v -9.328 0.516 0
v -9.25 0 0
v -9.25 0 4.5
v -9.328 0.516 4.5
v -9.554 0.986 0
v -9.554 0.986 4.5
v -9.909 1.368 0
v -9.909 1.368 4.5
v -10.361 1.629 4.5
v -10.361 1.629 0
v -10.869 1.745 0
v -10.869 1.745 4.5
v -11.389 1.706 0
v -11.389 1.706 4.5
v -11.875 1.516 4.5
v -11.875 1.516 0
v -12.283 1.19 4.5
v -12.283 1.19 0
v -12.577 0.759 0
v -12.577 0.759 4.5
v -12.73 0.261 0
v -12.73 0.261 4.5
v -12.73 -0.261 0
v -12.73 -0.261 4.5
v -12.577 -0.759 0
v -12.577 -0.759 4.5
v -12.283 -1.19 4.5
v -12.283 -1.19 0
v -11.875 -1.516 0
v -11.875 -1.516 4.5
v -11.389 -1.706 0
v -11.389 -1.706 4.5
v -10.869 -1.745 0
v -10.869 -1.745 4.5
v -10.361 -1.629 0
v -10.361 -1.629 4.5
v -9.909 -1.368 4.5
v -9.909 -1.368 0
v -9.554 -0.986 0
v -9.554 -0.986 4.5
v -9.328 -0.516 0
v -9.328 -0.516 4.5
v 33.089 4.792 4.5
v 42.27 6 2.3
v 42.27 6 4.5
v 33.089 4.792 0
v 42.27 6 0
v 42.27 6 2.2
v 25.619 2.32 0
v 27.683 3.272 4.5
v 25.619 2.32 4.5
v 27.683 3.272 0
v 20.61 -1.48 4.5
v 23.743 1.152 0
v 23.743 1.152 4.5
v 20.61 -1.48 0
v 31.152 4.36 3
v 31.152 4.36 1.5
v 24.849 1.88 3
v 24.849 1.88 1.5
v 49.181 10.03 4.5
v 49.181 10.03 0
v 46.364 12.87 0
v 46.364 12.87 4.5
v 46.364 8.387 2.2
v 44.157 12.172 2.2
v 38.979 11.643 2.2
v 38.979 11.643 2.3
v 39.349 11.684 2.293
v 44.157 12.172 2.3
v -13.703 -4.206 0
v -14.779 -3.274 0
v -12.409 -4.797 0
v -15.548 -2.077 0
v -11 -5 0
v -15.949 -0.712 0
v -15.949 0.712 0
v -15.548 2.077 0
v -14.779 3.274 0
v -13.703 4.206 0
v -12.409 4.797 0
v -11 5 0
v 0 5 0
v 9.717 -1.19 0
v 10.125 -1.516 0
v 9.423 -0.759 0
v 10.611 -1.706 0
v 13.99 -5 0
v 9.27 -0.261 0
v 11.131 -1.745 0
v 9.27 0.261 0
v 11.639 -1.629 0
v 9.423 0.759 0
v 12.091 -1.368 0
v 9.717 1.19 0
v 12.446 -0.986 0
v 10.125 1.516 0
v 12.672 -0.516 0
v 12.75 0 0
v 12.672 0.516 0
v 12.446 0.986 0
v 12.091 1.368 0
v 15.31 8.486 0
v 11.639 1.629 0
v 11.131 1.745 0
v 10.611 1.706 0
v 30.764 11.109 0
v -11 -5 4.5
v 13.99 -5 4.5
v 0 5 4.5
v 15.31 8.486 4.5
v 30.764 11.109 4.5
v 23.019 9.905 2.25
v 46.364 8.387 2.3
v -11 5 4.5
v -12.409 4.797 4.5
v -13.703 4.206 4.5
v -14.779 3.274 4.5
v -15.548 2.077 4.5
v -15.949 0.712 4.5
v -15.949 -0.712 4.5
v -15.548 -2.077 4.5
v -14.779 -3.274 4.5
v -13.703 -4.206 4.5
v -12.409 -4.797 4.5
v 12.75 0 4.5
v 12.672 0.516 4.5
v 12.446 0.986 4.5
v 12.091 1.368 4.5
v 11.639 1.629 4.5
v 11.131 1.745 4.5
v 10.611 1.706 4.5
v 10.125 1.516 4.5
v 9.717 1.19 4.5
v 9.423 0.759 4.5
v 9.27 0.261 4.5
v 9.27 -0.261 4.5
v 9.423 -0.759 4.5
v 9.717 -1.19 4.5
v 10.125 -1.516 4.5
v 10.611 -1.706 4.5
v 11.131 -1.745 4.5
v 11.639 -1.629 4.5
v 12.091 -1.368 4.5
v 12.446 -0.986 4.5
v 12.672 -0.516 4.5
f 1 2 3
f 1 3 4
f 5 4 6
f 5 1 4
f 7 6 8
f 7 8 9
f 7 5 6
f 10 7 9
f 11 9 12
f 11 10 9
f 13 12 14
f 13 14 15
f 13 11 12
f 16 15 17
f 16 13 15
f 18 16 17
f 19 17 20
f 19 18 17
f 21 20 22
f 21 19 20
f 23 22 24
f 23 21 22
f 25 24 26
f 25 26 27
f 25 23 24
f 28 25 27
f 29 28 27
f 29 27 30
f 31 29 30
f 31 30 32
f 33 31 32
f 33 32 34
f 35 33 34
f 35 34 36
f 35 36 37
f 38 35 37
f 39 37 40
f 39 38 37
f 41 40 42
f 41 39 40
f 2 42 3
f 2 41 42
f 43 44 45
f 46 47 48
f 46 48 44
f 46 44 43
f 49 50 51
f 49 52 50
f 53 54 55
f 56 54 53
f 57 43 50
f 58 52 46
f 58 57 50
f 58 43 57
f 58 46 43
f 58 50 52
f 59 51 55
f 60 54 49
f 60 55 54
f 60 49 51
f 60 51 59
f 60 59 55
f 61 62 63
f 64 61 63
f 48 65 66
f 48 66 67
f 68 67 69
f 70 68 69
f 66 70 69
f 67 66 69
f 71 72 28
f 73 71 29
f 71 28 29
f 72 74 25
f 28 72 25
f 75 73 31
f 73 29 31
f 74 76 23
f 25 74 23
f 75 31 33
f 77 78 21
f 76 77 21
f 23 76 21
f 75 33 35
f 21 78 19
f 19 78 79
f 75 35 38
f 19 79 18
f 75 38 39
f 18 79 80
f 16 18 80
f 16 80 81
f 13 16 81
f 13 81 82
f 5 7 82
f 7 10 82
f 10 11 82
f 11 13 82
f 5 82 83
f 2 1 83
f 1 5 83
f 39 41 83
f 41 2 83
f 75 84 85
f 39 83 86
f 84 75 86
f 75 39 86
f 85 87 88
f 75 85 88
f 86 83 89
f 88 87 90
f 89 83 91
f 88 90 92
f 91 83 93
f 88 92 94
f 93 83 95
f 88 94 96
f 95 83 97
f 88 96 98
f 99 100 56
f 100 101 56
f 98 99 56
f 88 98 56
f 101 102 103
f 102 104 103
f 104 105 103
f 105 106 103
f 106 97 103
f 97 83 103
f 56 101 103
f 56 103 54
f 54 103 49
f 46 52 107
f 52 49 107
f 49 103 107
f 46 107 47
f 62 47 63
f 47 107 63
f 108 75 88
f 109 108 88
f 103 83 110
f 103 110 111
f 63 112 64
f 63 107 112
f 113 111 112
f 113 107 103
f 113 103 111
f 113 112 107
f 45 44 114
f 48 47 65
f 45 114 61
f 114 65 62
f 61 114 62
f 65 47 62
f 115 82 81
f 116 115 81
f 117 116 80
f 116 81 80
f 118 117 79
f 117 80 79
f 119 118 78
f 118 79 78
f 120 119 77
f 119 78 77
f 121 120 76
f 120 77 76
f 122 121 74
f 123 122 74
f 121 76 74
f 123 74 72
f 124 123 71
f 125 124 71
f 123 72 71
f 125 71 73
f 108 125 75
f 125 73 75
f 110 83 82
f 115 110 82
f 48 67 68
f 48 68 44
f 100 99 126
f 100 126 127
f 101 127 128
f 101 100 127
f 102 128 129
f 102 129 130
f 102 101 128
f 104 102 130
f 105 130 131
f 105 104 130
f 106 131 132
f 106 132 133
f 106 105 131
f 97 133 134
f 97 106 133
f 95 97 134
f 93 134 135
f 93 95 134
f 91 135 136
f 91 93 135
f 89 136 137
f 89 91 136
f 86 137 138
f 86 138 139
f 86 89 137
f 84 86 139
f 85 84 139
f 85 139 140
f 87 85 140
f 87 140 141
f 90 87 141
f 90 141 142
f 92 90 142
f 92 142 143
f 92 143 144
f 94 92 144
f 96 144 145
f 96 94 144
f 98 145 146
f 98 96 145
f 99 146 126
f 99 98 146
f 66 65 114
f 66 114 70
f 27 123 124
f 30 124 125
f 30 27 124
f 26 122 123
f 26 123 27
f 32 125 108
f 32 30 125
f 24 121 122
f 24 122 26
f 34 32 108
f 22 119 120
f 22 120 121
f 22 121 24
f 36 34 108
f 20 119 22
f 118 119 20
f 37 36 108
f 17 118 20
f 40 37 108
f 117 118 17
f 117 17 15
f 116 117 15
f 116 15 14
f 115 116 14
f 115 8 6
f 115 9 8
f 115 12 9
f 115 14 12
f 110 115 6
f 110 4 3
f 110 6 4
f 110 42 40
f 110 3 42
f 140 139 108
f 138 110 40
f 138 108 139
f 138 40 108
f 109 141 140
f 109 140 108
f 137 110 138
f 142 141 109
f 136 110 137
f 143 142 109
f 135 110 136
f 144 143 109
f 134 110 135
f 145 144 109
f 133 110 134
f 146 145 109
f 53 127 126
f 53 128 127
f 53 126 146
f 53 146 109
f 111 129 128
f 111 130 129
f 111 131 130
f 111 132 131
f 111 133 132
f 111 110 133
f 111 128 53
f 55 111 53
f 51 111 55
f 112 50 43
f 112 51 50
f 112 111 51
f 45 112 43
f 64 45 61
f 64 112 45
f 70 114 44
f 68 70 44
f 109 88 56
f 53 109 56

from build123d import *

# Parameters (mm, degrees)
SKETCH1_R           = 5
SKETCH1_R_2         = 1.75
BOSS_EXTRUDE1_DEPTH = 4.5
BOSS_EXTRUDE2_START = -4.5
BOSS_EXTRUDE2_DEPTH = 4.5
CUT_EXTRUDE3_START  = 2.2
CUT_EXTRUDE3_DEPTH  = 0.1


# Read off the part's stored shape, not the designer's step: Cut-Extrude3
with BuildPart() as part:
    # Sketch1 → Boss-Extrude1 (new body)
    # profile 1 of 3: a face of its own
    with BuildSketch(Plane.XY):
        with Locations((-11, 0)):
            Circle(SKETCH1_R)
        with Locations((-11, 0)):
            Circle(SKETCH1_R_2, mode=Mode.SUBTRACT)
    # profile 2 of 3: a face of its own
    with BuildSketch(Plane.XY):
        with Locations((11, 0)):
            Circle(SKETCH1_R)
        with Locations((11, 0)):
            Circle(SKETCH1_R_2, mode=Mode.SUBTRACT)
    # profile 3 of 3: a face of its own
    with BuildSketch(Plane.XY):
        with BuildLine():
            Line((11, 5), (-11, 5))
            ThreePointArc((-11, 5), (-7.464466094, 3.535533906), (-6, 0))
            ThreePointArc((-6, 0), (-7.464466094, -3.535533906), (-11, -5))
            Line((-11, -5), (11.000000019, -5))
            ThreePointArc((11.000000019, -5), (6, -9e-09), (11, 5))
        make_face()
    extrude(amount=BOSS_EXTRUDE1_DEPTH)

    # Sketch5 → Boss-Extrude2 (add)
    with BuildSketch(Plane.XY.offset(4.5).offset(BOSS_EXTRUDE2_START)):
        with BuildLine():
            Line((11, -5), (13.99, -5))
            Line((13.99, -5), (20.61, -1.48))
            add(Edge.make_bspline(
                [(42.27, 6), (27.826894641, 4.768168558), (24.733930665, 2.331798547), (20.61, -1.48)],
                knots=[0, 0, 0, 0, 1, 1, 1, 1], degree=3))
            Line((42.27, 6), (49.180795902, 10.03))
            Line((49.180795902, 10.03), (46.363989199, 12.87))
            add(Edge.make_bspline(
                [(0, 5), (22.856130072, 10.87555535), (46.363989199, 12.87)],
                knots=[0, 0, 0, 1, 1, 1], degree=2))
            Line((0, 5), (11, 5))
            ThreePointArc((11, 5), (16, 0), (11, -5))
        make_face()
    extrude(amount=BOSS_EXTRUDE2_DEPTH)

    # Cut-Extrude3 outline → Cut-Extrude3 (cut)
    with BuildSketch(Plane.XY.offset(CUT_EXTRUDE3_START)):
        with BuildLine():
            add(Edge.make_bspline(
                [(38.979397214, 11.642850201), (39.348659921, 11.684028726), (39.718010294, 11.724686129), (40.087448338, 11.76482241), (40.456974055, 11.804437571), (40.826587452, 11.843531609), (41.196288532, 11.882104526), (41.566077299, 11.920156321), (41.935953757, 11.957686995), (42.305917912, 11.994696547), (42.675969767, 12.031184976), (43.046109327, 12.067152283), (43.416336595, 12.102598468), (43.786651577, 12.13752353), (44.157054276, 12.17192747)],
                knots=[0.500328151, 0.500328151, 0.500328151, 0.500328151, 0.500328151, 0.500328151, 0.500328151, 0.500328151, 0.500328151, 0.500328151, 0.500328151, 0.500328151, 0.500328151, 0.500328151, 0.500328151, 0.500437892, 0.500437892, 0.500437892, 0.500437892, 0.500437892, 0.500437892, 0.500437892, 0.500437892, 0.500437892, 0.500437892, 0.500437892, 0.500437892, 0.500437892, 0.500437892, 0.500437892], degree=14))
            Line((38.979397214, 11.642850201), (42.27, 6))
            Line((42.27, 6), (46.363989199, 8.387391656))
            Line((46.363989199, 8.387391656), (44.157054276, 12.17192747))
        make_face()
    extrude(amount=CUT_EXTRUDE3_DEPTH, mode=Mode.SUBTRACT)


solid = part.part
